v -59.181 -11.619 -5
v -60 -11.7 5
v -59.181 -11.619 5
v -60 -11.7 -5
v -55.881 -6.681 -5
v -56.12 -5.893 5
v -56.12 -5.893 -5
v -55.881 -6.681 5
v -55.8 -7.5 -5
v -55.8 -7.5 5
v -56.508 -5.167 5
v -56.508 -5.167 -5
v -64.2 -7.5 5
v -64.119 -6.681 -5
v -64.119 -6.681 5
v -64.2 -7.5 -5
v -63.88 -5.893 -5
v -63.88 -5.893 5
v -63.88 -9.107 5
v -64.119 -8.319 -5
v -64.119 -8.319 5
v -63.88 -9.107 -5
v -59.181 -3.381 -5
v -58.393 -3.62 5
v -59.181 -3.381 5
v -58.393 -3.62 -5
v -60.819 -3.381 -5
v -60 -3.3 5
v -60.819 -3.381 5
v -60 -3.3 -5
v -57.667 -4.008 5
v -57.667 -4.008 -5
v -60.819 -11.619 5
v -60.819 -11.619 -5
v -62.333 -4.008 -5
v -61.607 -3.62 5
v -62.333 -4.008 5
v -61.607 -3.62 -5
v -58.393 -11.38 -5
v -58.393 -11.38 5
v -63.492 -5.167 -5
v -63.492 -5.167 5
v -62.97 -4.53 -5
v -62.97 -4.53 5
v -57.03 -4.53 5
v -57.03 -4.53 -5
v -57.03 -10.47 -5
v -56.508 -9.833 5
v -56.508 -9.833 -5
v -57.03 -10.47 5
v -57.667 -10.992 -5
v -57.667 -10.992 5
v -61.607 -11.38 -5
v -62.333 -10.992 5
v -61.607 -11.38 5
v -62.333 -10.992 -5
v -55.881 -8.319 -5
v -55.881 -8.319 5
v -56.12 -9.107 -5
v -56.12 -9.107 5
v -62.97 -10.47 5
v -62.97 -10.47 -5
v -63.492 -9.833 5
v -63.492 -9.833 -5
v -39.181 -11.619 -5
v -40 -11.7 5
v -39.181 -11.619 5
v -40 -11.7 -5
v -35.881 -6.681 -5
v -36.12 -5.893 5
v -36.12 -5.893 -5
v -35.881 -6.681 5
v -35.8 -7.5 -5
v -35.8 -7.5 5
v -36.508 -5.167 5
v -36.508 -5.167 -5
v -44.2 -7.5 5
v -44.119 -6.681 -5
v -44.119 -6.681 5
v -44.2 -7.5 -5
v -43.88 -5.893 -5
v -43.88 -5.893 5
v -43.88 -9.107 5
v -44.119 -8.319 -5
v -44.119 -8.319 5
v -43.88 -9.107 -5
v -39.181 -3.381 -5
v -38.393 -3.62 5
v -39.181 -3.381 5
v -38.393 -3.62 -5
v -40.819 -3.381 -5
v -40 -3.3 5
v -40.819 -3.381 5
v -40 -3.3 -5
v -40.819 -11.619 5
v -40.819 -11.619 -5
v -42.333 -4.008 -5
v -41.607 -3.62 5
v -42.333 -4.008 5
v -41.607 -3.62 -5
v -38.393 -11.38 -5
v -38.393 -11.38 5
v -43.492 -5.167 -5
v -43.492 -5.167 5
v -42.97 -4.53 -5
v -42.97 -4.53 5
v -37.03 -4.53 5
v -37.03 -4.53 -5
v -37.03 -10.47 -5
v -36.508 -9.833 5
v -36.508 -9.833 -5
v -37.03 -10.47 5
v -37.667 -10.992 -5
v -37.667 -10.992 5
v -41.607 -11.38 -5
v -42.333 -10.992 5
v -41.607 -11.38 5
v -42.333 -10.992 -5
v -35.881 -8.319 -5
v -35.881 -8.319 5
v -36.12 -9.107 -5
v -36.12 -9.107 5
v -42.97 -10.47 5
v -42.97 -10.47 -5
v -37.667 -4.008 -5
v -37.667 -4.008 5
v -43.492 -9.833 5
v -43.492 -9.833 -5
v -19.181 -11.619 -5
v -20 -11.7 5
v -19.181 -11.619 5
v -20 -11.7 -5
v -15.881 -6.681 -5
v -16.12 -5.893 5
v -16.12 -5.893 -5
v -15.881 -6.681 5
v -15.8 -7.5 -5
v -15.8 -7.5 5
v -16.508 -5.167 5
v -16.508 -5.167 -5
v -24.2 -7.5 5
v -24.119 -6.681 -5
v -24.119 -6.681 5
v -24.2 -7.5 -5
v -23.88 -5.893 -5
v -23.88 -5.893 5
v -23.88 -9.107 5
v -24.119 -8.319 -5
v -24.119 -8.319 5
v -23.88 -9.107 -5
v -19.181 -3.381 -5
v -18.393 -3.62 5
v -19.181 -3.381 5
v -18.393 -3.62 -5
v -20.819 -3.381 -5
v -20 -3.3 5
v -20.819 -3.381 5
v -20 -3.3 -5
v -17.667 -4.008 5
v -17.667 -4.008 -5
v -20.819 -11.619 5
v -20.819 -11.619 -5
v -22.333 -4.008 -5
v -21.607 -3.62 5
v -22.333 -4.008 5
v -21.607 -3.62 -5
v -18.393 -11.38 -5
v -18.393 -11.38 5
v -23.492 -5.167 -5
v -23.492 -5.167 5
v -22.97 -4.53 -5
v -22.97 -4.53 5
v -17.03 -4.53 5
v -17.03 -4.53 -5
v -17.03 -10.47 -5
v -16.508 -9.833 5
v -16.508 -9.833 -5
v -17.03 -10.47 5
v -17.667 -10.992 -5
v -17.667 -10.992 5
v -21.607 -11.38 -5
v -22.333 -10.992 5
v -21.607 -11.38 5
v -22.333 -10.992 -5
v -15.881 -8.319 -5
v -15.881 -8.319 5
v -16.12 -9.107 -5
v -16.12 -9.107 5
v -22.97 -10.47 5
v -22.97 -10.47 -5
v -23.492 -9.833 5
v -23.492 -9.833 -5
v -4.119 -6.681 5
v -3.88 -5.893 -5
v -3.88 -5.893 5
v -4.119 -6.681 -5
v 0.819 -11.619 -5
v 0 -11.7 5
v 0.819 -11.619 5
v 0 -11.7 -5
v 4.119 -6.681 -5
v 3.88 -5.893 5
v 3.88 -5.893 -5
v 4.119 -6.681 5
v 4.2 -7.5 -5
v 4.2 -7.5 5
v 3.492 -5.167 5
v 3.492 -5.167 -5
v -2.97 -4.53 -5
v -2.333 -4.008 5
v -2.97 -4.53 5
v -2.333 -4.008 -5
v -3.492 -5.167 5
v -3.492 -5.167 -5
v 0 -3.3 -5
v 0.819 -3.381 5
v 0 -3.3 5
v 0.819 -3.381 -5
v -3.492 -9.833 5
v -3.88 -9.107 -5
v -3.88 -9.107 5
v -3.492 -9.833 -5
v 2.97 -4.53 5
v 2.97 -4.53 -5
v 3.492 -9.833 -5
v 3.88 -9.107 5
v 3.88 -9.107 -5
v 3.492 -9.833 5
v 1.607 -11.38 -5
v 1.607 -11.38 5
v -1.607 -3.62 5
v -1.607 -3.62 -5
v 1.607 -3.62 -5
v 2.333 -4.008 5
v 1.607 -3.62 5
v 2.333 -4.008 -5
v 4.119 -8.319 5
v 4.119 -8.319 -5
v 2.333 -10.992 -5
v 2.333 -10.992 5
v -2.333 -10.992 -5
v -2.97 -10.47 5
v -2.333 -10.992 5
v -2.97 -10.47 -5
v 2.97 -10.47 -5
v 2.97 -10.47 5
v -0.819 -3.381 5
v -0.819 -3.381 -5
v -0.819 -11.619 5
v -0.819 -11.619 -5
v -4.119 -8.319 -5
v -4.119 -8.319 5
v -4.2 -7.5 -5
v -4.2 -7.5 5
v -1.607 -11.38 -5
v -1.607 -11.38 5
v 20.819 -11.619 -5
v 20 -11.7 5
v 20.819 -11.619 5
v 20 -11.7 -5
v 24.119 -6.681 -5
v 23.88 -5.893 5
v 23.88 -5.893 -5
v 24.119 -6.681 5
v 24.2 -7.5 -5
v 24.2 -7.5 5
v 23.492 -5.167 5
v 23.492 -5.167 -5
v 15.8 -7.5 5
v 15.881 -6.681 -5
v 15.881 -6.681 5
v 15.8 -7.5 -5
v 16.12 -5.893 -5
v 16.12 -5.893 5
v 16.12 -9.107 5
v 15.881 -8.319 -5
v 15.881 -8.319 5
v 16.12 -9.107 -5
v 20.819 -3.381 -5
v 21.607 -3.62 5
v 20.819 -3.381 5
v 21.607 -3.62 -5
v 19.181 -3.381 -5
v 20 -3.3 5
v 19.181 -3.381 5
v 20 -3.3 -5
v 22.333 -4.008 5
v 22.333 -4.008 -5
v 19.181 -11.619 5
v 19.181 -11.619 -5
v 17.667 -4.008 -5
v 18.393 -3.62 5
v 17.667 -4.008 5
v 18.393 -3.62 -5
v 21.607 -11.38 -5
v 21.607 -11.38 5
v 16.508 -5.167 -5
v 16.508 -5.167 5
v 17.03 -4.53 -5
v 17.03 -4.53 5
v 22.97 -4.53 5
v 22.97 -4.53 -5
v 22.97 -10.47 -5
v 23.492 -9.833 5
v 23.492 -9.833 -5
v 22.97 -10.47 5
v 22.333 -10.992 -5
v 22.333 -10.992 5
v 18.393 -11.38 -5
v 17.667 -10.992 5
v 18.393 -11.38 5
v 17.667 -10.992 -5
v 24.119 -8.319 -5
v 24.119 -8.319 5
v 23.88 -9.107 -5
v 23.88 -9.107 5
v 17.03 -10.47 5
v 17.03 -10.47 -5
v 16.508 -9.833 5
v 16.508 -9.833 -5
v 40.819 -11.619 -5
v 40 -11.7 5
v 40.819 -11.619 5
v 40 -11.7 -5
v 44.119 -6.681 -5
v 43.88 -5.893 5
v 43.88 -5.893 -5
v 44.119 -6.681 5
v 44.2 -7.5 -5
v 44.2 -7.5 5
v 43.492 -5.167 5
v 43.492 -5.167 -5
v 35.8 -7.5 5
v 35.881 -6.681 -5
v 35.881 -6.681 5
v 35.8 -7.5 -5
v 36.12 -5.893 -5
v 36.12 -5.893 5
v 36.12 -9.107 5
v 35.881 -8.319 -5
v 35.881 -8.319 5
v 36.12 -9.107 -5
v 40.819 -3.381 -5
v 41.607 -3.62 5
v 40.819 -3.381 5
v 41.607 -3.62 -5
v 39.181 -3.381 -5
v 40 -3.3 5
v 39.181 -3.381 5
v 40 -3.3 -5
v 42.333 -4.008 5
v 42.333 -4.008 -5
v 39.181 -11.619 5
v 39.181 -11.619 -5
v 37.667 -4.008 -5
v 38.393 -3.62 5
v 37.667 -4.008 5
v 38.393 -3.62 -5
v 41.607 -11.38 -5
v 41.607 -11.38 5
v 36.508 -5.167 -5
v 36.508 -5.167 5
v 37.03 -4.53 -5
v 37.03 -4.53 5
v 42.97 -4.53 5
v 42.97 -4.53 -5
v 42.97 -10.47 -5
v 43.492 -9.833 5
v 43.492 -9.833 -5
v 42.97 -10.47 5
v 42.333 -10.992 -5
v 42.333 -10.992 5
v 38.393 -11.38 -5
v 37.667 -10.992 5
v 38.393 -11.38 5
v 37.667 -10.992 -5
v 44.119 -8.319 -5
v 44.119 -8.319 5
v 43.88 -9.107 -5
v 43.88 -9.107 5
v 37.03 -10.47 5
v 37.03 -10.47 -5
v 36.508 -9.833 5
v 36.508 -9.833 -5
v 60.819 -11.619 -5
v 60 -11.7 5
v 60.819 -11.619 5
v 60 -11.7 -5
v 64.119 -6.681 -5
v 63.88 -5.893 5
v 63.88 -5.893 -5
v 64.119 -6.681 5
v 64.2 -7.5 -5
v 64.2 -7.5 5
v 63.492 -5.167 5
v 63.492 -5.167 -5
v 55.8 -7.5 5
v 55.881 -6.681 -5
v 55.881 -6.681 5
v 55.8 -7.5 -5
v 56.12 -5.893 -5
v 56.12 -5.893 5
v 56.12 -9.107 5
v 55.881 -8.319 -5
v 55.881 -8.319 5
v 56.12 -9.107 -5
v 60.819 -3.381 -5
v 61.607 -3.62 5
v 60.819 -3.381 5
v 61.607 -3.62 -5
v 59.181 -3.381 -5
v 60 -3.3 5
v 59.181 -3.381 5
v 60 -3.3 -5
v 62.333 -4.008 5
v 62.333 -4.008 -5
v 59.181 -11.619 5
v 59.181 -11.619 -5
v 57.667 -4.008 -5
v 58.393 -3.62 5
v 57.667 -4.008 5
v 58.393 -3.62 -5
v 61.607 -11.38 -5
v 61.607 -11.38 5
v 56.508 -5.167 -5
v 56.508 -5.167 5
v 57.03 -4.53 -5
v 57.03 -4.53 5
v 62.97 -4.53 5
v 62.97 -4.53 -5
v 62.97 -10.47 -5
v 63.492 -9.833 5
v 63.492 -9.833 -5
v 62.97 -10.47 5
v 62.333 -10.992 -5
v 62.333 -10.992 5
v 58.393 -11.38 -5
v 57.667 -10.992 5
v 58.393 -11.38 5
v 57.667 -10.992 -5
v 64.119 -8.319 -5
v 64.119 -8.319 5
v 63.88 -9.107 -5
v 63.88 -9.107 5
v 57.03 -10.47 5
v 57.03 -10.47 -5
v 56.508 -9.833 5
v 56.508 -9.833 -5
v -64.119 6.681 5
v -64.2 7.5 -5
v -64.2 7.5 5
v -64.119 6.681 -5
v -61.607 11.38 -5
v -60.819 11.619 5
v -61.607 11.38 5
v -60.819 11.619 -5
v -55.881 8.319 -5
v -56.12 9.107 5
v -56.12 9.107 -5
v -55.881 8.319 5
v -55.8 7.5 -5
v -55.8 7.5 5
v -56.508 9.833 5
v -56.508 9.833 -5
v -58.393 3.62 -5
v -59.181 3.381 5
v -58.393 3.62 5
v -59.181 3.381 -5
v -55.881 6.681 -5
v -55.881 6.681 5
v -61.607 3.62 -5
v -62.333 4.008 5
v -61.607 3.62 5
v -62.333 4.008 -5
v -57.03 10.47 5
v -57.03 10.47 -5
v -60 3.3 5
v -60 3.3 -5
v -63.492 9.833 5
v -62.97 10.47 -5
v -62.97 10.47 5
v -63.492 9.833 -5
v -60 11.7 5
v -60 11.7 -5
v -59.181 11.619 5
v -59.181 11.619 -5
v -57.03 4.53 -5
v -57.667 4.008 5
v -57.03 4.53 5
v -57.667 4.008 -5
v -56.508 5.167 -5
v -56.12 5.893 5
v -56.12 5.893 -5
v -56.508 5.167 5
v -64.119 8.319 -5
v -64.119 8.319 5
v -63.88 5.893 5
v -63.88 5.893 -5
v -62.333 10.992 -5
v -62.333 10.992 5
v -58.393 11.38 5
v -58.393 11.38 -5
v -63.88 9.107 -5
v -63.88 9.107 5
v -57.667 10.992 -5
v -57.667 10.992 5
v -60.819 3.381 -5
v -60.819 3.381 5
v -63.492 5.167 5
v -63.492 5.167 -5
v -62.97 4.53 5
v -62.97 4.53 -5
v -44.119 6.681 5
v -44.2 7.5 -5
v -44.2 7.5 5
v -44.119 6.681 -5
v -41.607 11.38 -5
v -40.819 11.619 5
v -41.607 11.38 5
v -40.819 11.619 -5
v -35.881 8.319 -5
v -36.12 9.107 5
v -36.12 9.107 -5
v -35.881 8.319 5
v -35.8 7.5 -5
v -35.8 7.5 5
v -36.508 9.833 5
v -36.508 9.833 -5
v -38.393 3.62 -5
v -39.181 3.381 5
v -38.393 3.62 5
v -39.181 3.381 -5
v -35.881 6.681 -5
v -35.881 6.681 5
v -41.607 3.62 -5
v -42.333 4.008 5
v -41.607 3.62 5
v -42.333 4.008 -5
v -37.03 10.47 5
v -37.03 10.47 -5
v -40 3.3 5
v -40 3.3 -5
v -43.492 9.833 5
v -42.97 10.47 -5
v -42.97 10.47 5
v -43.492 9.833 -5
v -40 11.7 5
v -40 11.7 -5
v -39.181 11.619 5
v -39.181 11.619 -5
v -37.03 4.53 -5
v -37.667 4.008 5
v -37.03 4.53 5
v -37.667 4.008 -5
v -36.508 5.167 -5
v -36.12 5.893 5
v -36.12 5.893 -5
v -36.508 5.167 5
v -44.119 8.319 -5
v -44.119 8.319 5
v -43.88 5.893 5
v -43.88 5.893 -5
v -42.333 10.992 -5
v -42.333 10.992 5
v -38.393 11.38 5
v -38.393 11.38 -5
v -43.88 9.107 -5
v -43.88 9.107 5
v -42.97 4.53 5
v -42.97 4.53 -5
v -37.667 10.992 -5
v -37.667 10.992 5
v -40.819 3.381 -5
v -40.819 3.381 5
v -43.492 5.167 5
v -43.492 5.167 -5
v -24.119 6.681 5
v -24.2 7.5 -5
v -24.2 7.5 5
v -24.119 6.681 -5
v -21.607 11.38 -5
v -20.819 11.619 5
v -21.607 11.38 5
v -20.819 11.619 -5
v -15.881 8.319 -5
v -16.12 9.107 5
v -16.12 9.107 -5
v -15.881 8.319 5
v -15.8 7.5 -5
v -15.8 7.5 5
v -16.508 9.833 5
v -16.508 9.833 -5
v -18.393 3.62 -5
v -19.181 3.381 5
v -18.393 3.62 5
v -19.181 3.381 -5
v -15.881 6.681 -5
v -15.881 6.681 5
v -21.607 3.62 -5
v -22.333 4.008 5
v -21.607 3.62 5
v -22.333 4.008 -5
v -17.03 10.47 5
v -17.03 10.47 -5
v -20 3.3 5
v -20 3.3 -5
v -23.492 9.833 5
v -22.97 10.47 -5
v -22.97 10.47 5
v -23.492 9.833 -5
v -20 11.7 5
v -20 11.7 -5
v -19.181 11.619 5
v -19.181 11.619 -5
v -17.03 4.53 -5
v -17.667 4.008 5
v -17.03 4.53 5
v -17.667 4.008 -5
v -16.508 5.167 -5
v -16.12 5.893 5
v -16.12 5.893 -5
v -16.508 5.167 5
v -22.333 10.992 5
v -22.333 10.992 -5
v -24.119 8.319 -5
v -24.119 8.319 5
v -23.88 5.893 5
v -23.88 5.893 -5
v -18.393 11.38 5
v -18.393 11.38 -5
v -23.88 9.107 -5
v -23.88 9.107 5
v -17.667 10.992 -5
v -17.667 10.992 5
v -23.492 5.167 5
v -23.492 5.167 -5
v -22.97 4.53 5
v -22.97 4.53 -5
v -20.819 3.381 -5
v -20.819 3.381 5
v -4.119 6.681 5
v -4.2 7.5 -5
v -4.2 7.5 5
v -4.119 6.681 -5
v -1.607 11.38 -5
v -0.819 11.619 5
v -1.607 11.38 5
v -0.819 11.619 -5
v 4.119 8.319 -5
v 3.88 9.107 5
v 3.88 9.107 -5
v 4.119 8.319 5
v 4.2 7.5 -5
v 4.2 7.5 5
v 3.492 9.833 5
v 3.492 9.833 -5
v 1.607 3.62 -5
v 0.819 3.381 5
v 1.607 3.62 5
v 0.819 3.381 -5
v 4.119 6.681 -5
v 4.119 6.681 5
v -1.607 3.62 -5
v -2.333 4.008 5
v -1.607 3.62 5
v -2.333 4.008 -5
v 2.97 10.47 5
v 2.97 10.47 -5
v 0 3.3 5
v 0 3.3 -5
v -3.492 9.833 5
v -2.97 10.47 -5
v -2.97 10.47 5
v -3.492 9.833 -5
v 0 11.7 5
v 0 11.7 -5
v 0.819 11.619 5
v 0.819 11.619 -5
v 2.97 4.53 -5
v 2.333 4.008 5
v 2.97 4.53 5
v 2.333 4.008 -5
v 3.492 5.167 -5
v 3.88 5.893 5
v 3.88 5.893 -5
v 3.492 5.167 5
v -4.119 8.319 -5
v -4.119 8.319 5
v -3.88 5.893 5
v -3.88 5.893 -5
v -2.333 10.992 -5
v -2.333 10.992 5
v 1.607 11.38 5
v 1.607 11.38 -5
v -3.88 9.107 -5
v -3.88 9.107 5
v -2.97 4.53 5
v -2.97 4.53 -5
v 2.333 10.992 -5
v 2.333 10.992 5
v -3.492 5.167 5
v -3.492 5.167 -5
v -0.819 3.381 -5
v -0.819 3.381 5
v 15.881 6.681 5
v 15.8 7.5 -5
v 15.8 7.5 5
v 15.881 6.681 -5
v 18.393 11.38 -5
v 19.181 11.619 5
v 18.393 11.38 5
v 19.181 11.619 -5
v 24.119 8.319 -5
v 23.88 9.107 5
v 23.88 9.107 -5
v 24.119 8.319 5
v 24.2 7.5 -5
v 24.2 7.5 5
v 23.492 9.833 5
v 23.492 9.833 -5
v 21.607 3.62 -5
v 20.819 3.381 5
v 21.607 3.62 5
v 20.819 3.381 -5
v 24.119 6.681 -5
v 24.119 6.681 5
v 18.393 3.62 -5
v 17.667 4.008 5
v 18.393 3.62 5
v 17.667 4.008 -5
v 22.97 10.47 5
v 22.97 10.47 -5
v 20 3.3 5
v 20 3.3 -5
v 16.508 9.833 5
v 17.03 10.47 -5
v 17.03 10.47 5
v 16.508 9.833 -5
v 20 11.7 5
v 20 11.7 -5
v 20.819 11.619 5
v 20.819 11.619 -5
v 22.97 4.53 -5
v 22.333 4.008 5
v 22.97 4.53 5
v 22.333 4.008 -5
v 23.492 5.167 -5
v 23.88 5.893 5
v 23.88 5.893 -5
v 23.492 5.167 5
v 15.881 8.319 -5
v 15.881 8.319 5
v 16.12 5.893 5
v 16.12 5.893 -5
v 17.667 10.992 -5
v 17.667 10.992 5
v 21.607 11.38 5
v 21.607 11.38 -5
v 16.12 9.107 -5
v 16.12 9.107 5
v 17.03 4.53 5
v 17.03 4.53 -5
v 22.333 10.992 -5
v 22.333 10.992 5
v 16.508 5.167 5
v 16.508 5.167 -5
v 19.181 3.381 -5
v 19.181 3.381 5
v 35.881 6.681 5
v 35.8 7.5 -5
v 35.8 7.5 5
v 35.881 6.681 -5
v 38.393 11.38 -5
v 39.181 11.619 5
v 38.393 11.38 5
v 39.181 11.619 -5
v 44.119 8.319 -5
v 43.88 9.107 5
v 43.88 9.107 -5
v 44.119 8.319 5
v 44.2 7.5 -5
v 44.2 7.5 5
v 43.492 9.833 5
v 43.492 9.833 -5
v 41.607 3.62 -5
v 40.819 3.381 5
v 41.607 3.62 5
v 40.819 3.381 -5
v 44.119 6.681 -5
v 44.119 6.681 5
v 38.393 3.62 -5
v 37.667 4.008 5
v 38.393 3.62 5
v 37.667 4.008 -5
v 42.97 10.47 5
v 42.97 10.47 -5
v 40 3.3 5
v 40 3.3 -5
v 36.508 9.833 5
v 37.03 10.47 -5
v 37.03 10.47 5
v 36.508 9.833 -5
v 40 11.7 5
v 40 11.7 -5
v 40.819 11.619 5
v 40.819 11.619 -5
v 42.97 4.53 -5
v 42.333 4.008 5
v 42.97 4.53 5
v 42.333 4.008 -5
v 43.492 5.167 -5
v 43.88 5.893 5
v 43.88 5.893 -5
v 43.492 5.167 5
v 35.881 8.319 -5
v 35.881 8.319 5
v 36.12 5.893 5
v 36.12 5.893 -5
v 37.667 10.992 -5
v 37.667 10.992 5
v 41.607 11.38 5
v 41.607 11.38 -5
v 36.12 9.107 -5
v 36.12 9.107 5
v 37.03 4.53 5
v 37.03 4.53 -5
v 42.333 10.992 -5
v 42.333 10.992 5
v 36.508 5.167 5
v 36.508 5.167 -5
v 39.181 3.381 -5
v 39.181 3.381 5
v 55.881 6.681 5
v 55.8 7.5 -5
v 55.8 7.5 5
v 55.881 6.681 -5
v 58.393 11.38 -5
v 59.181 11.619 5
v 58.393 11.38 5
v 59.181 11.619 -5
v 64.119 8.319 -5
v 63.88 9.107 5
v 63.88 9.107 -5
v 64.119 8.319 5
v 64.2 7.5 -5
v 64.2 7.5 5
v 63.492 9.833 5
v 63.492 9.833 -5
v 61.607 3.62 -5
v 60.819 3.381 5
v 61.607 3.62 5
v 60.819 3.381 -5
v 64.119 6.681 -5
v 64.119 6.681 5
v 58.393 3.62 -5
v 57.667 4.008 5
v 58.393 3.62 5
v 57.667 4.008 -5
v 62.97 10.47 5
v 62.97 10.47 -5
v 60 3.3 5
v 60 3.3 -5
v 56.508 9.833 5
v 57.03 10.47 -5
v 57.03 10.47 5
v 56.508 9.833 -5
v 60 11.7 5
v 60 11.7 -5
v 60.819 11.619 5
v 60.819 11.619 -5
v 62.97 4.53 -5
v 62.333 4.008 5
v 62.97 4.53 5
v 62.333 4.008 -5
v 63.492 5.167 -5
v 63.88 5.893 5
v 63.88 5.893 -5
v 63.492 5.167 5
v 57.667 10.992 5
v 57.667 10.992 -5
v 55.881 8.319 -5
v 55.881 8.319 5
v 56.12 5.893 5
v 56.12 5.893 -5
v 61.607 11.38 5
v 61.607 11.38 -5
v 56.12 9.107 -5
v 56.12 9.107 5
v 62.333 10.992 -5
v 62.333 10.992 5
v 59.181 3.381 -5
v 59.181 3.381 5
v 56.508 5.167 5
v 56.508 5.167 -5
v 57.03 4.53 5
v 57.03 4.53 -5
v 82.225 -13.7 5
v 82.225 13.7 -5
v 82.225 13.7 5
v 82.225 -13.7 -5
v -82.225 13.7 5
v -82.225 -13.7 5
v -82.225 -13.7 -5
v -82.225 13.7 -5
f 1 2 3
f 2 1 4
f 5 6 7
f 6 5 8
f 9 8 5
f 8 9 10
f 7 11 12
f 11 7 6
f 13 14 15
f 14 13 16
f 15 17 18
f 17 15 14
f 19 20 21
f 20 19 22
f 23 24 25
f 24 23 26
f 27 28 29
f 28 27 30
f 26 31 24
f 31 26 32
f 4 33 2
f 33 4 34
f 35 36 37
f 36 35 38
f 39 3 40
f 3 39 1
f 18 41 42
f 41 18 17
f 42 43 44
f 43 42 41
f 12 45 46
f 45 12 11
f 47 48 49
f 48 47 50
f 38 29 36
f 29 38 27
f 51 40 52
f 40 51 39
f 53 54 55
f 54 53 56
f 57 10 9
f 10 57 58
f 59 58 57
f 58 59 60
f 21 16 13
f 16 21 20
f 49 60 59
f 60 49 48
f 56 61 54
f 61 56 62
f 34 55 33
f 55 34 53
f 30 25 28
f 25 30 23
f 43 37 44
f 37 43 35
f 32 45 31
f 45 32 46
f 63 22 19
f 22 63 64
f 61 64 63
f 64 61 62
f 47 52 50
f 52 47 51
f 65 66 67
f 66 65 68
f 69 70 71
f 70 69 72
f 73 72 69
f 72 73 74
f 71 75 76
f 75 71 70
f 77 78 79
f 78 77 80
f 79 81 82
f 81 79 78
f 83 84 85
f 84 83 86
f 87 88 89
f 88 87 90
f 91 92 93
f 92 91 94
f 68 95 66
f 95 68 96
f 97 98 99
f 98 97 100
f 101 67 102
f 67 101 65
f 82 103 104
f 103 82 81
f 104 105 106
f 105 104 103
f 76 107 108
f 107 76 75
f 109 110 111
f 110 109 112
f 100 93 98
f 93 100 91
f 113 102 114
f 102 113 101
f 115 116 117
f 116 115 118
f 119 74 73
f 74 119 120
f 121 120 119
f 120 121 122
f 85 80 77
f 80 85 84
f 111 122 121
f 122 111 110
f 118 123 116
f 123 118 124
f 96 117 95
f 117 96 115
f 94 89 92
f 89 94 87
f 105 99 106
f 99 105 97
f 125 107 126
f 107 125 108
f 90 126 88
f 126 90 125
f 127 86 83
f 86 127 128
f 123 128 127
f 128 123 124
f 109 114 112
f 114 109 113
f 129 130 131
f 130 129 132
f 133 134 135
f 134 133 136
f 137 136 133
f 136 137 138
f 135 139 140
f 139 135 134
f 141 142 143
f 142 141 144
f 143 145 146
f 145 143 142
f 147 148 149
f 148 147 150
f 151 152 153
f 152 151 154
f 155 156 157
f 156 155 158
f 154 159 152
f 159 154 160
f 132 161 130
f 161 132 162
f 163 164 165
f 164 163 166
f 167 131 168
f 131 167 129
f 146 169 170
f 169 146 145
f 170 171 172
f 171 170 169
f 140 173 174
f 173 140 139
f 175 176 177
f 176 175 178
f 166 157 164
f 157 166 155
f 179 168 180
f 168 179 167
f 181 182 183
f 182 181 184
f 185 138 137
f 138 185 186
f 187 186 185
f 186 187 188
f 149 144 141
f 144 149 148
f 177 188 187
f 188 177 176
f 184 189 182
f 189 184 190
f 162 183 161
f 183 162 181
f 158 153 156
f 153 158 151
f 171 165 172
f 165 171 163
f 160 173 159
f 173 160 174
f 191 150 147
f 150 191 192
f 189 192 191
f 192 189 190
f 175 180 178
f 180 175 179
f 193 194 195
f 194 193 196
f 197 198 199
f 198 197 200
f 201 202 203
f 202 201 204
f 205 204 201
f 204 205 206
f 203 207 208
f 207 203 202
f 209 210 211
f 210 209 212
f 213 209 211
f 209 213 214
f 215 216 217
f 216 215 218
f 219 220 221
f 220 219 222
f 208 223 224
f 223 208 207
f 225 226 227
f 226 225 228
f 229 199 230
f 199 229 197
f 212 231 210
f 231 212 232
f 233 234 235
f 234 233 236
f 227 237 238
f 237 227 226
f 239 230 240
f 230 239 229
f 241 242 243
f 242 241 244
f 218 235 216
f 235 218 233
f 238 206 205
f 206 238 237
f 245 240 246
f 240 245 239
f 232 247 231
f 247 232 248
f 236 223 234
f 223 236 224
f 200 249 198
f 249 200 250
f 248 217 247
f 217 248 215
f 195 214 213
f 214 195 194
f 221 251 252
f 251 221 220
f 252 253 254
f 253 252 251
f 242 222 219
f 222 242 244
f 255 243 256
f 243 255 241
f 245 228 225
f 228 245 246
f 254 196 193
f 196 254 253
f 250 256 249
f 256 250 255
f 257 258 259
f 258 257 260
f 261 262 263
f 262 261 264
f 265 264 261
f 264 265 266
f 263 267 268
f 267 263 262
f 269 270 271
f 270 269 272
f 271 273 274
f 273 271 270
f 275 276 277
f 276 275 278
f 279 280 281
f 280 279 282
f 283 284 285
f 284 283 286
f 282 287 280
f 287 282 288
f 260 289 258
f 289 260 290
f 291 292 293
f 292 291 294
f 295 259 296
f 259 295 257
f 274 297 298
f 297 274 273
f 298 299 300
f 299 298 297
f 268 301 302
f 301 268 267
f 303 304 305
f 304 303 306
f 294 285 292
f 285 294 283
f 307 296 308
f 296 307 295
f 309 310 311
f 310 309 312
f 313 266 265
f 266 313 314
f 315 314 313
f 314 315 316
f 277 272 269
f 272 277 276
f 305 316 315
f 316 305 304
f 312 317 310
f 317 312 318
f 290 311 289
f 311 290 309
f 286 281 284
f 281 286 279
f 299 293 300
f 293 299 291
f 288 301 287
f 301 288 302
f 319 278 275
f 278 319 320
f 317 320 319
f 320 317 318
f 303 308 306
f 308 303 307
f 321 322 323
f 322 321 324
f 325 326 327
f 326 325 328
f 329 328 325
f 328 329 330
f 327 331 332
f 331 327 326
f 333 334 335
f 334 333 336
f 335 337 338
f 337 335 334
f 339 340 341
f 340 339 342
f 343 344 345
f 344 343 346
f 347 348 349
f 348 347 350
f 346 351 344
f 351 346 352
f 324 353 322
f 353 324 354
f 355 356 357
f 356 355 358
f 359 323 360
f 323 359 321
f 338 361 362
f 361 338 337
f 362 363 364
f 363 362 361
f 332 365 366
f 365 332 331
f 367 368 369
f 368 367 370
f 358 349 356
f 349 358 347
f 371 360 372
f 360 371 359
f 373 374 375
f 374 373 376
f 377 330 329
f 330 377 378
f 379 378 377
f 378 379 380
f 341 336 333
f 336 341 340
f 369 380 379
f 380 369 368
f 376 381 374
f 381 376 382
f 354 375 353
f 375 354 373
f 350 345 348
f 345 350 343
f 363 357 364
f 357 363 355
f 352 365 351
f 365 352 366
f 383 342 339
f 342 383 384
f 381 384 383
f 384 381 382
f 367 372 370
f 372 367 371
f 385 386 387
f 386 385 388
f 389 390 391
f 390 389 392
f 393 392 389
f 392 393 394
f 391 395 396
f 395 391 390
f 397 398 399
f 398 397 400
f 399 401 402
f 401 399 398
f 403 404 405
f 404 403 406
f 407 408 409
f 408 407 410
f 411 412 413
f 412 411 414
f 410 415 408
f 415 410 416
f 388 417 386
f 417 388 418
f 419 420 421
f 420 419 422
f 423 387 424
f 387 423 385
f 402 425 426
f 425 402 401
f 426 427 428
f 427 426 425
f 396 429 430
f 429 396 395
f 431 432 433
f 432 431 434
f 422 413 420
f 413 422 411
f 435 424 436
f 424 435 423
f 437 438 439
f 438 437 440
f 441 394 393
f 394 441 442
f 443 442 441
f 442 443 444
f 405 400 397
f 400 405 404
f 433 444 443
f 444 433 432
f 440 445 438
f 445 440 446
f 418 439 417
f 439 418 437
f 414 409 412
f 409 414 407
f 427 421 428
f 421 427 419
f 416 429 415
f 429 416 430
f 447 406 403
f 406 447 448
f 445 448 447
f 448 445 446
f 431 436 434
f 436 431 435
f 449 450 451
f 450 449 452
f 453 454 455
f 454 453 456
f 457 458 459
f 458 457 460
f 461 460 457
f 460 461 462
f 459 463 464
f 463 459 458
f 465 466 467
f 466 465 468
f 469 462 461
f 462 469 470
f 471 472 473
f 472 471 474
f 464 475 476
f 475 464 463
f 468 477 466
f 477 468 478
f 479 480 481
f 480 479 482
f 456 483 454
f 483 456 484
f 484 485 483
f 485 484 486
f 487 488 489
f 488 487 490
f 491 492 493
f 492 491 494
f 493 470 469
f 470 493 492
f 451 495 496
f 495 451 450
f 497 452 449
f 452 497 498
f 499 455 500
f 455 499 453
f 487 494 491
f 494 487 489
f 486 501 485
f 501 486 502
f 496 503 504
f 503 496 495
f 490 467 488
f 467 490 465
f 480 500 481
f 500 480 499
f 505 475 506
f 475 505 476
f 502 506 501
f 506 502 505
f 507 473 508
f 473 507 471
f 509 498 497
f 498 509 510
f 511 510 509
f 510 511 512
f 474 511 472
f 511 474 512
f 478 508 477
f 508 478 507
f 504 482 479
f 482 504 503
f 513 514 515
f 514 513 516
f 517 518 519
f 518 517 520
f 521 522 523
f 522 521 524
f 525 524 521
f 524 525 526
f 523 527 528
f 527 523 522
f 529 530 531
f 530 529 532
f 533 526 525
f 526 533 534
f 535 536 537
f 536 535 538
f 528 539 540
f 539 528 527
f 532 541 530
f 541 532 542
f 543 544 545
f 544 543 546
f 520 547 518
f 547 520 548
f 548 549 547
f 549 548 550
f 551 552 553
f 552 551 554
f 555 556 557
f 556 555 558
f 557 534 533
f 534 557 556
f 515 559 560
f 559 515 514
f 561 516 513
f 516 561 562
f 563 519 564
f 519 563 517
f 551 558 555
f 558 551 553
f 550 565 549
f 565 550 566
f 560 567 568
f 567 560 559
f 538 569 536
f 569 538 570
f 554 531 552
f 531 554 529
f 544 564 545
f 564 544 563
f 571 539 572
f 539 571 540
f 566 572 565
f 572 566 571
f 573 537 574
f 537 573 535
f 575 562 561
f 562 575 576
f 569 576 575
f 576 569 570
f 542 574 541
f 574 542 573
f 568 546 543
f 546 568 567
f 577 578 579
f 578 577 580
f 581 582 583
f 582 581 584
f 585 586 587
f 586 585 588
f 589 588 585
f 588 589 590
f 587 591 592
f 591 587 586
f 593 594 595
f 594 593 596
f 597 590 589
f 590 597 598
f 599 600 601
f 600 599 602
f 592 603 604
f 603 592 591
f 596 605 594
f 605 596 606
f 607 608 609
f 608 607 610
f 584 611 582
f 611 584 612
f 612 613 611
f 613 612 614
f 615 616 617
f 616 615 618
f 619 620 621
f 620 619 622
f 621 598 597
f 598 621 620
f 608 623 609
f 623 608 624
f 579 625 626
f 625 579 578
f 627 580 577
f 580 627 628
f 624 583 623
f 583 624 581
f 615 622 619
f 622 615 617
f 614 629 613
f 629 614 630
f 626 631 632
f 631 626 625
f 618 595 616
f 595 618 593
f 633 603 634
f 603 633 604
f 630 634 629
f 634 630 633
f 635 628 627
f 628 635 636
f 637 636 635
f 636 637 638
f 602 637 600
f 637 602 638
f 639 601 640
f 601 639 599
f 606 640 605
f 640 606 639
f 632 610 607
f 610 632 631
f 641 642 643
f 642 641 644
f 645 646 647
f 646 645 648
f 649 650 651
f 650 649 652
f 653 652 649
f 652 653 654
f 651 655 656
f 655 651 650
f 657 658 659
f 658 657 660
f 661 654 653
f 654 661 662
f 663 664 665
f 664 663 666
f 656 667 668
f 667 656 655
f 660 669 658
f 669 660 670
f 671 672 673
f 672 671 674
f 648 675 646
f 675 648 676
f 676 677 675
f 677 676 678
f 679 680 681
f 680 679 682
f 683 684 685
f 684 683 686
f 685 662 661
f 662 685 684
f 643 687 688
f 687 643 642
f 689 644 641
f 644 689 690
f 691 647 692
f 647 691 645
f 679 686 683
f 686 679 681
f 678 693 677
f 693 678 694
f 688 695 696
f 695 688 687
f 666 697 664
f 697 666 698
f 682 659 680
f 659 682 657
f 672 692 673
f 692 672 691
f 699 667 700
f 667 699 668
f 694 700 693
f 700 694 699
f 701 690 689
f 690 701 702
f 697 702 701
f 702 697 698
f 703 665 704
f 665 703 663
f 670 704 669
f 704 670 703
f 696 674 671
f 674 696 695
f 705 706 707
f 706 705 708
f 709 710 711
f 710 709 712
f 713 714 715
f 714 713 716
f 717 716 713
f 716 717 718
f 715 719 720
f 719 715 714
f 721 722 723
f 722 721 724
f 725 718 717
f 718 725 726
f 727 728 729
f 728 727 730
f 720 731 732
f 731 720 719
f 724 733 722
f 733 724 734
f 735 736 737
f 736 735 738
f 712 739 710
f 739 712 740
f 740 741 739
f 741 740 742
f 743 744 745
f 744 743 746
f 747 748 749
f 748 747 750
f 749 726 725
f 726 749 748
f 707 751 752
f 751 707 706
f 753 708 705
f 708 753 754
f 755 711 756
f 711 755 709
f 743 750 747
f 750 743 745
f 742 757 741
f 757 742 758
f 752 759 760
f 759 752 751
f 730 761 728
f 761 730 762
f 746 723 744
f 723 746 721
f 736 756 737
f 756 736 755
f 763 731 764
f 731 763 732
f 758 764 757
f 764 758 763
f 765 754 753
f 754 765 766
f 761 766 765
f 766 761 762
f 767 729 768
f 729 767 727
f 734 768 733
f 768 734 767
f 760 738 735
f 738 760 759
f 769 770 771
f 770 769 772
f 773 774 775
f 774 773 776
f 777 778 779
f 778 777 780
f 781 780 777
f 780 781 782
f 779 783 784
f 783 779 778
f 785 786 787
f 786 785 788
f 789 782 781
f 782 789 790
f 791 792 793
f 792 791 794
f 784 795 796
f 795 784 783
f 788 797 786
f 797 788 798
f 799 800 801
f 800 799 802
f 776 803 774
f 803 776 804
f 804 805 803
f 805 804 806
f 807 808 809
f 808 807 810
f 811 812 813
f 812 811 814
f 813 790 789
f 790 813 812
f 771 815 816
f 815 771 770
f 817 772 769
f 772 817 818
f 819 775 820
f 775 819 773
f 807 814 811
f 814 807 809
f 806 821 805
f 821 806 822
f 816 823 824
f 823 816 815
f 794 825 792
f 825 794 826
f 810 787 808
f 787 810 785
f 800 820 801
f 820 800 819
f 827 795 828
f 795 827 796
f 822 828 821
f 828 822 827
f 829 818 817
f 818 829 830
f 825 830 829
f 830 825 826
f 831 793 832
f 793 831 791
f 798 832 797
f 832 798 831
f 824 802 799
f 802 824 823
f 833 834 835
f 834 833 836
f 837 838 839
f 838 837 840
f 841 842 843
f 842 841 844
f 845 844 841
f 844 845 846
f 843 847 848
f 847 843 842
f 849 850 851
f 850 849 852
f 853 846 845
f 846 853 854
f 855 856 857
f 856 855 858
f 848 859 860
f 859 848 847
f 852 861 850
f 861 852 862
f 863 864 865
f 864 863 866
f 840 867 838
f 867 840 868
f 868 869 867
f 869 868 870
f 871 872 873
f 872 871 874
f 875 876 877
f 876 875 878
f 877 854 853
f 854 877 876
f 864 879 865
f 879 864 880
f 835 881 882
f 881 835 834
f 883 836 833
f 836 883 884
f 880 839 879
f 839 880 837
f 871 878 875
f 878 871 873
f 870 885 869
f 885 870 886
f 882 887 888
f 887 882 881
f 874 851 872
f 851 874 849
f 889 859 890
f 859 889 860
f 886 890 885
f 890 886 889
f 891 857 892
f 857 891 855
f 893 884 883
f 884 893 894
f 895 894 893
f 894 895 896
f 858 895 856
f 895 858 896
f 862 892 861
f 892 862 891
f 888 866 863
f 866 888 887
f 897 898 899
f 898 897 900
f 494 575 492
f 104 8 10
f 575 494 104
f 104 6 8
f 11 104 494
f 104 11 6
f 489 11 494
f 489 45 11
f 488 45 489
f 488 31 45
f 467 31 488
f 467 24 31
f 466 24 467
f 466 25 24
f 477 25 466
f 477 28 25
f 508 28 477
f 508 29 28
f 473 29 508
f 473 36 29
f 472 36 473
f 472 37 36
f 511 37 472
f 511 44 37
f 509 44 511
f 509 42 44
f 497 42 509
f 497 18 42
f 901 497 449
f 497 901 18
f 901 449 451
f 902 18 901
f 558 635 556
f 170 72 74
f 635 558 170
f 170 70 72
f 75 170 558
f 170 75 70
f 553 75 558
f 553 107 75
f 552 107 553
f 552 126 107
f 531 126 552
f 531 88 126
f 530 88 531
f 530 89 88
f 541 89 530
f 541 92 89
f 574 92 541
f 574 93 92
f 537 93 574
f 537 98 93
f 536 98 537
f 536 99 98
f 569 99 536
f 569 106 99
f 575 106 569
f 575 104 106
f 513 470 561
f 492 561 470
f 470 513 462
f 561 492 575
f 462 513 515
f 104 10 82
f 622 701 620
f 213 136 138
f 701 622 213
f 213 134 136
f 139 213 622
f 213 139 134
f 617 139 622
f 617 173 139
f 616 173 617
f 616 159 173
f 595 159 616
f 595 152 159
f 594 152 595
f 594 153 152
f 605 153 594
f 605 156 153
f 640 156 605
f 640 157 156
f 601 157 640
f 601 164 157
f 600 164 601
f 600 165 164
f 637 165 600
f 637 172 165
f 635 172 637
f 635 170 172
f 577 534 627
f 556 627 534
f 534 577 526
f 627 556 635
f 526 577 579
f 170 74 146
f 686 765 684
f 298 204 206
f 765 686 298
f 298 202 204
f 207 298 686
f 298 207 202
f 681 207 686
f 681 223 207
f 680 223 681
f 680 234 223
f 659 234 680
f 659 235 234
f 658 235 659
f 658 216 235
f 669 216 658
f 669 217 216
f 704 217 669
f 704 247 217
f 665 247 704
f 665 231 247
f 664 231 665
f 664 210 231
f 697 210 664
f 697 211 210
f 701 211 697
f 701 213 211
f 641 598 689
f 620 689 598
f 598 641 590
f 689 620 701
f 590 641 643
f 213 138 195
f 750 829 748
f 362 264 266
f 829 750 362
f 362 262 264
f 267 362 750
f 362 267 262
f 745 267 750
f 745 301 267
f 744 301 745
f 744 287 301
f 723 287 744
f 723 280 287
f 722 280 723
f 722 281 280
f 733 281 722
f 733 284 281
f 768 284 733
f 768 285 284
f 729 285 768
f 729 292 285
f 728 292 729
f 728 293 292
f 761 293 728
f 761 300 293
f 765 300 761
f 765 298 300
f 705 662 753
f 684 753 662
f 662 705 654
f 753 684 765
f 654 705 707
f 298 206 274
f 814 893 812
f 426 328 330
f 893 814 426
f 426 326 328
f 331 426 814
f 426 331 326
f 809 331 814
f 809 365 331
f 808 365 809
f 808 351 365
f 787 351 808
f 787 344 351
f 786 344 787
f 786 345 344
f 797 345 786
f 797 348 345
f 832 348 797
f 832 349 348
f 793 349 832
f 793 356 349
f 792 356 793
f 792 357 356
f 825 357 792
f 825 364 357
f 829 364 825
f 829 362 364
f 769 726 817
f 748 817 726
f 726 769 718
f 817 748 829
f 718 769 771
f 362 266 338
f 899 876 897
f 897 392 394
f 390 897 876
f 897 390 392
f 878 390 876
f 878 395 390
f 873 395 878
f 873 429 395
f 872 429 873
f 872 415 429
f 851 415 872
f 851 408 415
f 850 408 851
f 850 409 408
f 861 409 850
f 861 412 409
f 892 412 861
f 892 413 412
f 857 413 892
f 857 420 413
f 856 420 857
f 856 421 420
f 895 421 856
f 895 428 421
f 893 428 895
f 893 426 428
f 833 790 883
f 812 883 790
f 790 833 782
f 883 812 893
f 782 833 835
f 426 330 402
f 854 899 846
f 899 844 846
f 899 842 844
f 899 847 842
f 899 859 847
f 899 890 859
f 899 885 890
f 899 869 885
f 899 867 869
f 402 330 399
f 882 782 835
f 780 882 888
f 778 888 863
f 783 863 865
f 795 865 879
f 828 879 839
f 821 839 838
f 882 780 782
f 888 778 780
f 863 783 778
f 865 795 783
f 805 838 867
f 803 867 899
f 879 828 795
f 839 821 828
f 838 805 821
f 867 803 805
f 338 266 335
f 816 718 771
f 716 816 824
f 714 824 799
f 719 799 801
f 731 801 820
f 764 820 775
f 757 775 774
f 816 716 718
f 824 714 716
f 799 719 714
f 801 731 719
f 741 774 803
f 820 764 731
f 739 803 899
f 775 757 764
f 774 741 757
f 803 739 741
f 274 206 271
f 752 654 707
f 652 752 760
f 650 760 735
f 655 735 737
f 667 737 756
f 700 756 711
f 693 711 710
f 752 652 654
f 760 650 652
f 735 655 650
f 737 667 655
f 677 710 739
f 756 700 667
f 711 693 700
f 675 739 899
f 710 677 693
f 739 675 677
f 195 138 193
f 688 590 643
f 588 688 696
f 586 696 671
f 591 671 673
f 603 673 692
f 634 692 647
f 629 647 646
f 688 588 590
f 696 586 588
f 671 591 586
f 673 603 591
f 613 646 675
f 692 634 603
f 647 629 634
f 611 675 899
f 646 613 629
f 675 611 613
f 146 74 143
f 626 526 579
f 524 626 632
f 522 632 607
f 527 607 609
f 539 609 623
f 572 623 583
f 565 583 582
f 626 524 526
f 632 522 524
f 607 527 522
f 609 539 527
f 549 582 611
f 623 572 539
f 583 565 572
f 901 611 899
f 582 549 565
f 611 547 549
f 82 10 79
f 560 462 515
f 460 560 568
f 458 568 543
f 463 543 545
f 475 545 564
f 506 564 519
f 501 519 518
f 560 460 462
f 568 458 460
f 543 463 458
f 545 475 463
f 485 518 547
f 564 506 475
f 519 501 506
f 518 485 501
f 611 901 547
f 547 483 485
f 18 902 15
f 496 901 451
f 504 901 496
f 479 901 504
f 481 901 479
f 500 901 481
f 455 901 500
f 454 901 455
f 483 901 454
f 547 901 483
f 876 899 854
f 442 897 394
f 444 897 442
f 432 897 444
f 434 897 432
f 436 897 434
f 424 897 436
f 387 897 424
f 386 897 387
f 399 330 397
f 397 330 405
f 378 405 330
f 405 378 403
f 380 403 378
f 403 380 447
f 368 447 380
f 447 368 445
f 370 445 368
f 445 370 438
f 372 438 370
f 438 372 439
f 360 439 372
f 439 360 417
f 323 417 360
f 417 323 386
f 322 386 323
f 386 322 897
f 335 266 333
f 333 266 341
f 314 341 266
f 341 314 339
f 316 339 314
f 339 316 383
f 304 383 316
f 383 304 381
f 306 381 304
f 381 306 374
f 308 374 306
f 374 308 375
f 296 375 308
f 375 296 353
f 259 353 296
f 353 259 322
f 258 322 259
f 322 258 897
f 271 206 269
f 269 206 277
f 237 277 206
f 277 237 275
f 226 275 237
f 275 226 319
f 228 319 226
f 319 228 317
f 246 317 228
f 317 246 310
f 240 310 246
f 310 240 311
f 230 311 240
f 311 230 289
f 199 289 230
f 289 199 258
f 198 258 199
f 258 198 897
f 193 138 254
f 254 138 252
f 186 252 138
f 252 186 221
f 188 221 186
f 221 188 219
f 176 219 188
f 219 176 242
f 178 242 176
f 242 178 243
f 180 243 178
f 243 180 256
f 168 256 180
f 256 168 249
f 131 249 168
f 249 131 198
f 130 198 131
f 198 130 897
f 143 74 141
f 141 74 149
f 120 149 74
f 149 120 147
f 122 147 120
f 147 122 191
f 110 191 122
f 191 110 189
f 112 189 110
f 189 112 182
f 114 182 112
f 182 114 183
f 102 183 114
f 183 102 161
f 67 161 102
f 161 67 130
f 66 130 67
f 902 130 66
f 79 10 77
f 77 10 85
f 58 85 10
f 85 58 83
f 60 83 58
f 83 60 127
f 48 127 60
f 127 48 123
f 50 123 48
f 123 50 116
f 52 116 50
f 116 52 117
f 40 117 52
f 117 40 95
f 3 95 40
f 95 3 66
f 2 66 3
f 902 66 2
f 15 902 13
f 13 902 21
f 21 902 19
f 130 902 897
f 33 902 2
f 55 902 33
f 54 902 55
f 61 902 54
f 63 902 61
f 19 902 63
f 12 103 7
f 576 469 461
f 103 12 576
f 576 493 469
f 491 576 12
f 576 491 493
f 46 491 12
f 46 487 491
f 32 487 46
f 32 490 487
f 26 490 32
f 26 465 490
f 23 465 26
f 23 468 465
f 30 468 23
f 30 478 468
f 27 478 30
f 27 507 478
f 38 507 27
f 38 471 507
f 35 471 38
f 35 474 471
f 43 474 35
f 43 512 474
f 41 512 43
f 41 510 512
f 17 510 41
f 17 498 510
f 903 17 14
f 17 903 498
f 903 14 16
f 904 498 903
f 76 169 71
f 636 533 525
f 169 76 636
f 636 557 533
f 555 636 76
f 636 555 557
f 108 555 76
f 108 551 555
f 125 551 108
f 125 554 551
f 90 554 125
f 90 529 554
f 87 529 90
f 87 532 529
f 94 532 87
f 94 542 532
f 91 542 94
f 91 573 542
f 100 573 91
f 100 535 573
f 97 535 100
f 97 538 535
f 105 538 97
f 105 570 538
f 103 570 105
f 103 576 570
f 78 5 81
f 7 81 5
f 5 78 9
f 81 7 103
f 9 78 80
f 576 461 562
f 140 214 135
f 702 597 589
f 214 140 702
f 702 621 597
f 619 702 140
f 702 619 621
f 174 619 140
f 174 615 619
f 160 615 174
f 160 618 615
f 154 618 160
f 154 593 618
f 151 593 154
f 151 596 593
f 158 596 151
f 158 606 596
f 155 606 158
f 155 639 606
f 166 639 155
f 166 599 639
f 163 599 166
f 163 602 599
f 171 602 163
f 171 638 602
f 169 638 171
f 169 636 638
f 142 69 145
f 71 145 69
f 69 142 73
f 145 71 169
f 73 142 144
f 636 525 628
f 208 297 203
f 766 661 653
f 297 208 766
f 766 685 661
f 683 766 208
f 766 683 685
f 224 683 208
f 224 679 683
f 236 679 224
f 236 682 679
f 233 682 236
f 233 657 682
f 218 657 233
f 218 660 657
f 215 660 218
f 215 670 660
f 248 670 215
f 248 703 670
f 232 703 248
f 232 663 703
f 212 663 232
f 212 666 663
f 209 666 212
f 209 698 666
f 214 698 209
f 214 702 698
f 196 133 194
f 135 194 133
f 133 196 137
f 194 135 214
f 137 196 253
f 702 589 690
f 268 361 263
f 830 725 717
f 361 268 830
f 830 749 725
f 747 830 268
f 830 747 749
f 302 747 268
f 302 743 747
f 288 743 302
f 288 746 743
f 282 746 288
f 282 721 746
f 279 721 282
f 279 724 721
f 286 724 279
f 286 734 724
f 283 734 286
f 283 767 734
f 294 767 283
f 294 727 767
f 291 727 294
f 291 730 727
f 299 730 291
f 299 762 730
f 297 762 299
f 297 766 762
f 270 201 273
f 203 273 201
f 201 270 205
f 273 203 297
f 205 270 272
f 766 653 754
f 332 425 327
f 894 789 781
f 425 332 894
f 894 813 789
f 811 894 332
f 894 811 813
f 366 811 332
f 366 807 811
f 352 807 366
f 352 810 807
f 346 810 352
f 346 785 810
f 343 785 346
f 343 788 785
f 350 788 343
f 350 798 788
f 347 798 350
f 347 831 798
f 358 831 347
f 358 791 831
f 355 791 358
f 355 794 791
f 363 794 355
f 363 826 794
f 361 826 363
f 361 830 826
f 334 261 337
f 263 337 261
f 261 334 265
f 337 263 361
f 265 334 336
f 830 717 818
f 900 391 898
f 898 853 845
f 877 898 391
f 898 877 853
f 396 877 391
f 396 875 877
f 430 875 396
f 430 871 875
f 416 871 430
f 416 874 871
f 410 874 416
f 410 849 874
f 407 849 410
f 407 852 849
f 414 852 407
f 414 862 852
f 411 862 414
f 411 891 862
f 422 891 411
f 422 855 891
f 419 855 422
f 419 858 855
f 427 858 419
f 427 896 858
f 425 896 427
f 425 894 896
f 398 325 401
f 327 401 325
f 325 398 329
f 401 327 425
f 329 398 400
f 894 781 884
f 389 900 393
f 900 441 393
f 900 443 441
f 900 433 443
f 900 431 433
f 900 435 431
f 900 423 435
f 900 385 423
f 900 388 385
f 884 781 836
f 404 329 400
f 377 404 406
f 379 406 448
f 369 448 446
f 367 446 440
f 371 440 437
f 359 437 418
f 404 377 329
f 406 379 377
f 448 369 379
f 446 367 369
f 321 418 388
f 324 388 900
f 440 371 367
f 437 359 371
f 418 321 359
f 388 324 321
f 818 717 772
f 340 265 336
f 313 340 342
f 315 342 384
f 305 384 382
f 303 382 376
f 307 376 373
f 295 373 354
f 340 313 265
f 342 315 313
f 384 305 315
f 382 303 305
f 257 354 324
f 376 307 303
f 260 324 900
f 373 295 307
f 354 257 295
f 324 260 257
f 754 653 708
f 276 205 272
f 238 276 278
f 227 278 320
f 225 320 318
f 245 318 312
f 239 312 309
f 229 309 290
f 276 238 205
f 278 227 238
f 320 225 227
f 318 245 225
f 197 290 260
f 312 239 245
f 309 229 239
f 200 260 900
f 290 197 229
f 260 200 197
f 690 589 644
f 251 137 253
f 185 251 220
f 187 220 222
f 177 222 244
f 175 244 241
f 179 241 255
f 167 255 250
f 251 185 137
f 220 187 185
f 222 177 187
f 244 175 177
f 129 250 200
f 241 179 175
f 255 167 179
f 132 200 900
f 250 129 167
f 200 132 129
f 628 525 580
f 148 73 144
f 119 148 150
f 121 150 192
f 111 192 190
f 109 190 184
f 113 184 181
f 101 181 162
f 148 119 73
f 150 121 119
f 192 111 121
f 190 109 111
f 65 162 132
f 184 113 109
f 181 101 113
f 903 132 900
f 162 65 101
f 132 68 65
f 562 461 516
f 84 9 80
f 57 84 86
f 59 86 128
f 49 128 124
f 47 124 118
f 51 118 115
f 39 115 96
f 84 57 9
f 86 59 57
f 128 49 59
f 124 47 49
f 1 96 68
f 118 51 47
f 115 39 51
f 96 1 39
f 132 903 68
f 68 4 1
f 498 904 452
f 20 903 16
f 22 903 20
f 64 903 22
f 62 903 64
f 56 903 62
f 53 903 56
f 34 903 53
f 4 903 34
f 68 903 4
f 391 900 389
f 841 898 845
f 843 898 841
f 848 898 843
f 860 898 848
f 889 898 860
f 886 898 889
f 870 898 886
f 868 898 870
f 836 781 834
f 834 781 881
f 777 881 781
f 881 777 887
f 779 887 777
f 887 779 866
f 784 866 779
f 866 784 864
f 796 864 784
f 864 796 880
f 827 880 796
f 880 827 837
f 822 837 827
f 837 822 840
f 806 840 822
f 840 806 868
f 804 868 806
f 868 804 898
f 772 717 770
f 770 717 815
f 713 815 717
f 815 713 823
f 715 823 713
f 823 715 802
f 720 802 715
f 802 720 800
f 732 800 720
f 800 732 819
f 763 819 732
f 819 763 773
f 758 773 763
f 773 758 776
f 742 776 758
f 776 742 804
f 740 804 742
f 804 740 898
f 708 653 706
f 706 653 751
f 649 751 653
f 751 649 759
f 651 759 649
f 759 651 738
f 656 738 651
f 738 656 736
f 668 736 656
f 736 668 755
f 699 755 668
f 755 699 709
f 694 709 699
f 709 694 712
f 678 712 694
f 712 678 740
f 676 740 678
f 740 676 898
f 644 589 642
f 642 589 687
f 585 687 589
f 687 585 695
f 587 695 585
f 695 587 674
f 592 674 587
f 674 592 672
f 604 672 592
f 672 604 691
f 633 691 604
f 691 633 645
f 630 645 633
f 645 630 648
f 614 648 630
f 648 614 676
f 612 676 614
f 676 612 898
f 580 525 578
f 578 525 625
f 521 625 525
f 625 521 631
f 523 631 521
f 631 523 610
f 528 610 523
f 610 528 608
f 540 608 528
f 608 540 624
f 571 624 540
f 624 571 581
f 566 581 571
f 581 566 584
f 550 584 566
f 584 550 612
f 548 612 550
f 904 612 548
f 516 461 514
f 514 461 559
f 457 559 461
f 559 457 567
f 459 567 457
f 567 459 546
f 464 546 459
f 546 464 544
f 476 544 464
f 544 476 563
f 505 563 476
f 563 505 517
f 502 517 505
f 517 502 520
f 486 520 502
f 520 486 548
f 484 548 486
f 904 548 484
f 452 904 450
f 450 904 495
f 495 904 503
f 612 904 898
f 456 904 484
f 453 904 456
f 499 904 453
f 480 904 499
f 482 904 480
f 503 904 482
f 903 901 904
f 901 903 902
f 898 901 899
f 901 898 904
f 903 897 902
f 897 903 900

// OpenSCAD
$fn = 32;

// ----------------------------------------------------------------------
// Hole bar, 7 x Ø8.4
// tworows layout, 22.225 mm edge offset
// ----------------------------------------------------------------------

// --- parameters (mm) ---
bar_w = 27.4;     // bar width (Y)
bar_t = 10;       // bar thickness (Z)
holes = 7;        // holes per row
hole_d = 8.4;     // hole diameter
edge = 22.225;    // offset from the bar end to the first hole
pitch = 20;       // pitch between neighbouring holes
row_offset = 15;  // distance between the two rows

// --- derived feature positions (mm) ---
span = (holes - 1) * pitch;   // = 120   distance between the end holes
bar_l = span + 2 * edge;      // = 164.45   overall bar length
start_x = -bar_l / 2 + edge;  // = -60   X of the first hole
feature_centers = [
  [start_x + 0 * pitch, -row_offset / 2],
  [start_x + 1 * pitch, -row_offset / 2],
  [start_x + 2 * pitch, -row_offset / 2],
  [start_x + 3 * pitch, -row_offset / 2],
  [start_x + 4 * pitch, -row_offset / 2],
  [start_x + 5 * pitch, -row_offset / 2],
  [start_x + 6 * pitch, -row_offset / 2]
];   // hole centres of the first row
row2_centers = [
  [start_x + 0 * pitch, row_offset / 2],
  [start_x + 1 * pitch, row_offset / 2],
  [start_x + 2 * pitch, row_offset / 2],
  [start_x + 3 * pitch, row_offset / 2],
  [start_x + 4 * pitch, row_offset / 2],
  [start_x + 5 * pitch, row_offset / 2],
  [start_x + 6 * pitch, row_offset / 2]
];   // hole centres of the second row

// bar with two rows of holes, both read from their own centre arrays
difference() {
  translate([-bar_l / 2, -bar_w / 2, -bar_t / 2]) cube([bar_l, bar_w, bar_t]);
  for (centre = feature_centers)
    translate([centre[0], centre[1], 0])
      cylinder(d = hole_d, h = bar_t + 2, center = true);
  for (centre = row2_centers)
    translate([centre[0], centre[1], 0])
      cylinder(d = hole_d, h = bar_t + 2, center = true);
}
